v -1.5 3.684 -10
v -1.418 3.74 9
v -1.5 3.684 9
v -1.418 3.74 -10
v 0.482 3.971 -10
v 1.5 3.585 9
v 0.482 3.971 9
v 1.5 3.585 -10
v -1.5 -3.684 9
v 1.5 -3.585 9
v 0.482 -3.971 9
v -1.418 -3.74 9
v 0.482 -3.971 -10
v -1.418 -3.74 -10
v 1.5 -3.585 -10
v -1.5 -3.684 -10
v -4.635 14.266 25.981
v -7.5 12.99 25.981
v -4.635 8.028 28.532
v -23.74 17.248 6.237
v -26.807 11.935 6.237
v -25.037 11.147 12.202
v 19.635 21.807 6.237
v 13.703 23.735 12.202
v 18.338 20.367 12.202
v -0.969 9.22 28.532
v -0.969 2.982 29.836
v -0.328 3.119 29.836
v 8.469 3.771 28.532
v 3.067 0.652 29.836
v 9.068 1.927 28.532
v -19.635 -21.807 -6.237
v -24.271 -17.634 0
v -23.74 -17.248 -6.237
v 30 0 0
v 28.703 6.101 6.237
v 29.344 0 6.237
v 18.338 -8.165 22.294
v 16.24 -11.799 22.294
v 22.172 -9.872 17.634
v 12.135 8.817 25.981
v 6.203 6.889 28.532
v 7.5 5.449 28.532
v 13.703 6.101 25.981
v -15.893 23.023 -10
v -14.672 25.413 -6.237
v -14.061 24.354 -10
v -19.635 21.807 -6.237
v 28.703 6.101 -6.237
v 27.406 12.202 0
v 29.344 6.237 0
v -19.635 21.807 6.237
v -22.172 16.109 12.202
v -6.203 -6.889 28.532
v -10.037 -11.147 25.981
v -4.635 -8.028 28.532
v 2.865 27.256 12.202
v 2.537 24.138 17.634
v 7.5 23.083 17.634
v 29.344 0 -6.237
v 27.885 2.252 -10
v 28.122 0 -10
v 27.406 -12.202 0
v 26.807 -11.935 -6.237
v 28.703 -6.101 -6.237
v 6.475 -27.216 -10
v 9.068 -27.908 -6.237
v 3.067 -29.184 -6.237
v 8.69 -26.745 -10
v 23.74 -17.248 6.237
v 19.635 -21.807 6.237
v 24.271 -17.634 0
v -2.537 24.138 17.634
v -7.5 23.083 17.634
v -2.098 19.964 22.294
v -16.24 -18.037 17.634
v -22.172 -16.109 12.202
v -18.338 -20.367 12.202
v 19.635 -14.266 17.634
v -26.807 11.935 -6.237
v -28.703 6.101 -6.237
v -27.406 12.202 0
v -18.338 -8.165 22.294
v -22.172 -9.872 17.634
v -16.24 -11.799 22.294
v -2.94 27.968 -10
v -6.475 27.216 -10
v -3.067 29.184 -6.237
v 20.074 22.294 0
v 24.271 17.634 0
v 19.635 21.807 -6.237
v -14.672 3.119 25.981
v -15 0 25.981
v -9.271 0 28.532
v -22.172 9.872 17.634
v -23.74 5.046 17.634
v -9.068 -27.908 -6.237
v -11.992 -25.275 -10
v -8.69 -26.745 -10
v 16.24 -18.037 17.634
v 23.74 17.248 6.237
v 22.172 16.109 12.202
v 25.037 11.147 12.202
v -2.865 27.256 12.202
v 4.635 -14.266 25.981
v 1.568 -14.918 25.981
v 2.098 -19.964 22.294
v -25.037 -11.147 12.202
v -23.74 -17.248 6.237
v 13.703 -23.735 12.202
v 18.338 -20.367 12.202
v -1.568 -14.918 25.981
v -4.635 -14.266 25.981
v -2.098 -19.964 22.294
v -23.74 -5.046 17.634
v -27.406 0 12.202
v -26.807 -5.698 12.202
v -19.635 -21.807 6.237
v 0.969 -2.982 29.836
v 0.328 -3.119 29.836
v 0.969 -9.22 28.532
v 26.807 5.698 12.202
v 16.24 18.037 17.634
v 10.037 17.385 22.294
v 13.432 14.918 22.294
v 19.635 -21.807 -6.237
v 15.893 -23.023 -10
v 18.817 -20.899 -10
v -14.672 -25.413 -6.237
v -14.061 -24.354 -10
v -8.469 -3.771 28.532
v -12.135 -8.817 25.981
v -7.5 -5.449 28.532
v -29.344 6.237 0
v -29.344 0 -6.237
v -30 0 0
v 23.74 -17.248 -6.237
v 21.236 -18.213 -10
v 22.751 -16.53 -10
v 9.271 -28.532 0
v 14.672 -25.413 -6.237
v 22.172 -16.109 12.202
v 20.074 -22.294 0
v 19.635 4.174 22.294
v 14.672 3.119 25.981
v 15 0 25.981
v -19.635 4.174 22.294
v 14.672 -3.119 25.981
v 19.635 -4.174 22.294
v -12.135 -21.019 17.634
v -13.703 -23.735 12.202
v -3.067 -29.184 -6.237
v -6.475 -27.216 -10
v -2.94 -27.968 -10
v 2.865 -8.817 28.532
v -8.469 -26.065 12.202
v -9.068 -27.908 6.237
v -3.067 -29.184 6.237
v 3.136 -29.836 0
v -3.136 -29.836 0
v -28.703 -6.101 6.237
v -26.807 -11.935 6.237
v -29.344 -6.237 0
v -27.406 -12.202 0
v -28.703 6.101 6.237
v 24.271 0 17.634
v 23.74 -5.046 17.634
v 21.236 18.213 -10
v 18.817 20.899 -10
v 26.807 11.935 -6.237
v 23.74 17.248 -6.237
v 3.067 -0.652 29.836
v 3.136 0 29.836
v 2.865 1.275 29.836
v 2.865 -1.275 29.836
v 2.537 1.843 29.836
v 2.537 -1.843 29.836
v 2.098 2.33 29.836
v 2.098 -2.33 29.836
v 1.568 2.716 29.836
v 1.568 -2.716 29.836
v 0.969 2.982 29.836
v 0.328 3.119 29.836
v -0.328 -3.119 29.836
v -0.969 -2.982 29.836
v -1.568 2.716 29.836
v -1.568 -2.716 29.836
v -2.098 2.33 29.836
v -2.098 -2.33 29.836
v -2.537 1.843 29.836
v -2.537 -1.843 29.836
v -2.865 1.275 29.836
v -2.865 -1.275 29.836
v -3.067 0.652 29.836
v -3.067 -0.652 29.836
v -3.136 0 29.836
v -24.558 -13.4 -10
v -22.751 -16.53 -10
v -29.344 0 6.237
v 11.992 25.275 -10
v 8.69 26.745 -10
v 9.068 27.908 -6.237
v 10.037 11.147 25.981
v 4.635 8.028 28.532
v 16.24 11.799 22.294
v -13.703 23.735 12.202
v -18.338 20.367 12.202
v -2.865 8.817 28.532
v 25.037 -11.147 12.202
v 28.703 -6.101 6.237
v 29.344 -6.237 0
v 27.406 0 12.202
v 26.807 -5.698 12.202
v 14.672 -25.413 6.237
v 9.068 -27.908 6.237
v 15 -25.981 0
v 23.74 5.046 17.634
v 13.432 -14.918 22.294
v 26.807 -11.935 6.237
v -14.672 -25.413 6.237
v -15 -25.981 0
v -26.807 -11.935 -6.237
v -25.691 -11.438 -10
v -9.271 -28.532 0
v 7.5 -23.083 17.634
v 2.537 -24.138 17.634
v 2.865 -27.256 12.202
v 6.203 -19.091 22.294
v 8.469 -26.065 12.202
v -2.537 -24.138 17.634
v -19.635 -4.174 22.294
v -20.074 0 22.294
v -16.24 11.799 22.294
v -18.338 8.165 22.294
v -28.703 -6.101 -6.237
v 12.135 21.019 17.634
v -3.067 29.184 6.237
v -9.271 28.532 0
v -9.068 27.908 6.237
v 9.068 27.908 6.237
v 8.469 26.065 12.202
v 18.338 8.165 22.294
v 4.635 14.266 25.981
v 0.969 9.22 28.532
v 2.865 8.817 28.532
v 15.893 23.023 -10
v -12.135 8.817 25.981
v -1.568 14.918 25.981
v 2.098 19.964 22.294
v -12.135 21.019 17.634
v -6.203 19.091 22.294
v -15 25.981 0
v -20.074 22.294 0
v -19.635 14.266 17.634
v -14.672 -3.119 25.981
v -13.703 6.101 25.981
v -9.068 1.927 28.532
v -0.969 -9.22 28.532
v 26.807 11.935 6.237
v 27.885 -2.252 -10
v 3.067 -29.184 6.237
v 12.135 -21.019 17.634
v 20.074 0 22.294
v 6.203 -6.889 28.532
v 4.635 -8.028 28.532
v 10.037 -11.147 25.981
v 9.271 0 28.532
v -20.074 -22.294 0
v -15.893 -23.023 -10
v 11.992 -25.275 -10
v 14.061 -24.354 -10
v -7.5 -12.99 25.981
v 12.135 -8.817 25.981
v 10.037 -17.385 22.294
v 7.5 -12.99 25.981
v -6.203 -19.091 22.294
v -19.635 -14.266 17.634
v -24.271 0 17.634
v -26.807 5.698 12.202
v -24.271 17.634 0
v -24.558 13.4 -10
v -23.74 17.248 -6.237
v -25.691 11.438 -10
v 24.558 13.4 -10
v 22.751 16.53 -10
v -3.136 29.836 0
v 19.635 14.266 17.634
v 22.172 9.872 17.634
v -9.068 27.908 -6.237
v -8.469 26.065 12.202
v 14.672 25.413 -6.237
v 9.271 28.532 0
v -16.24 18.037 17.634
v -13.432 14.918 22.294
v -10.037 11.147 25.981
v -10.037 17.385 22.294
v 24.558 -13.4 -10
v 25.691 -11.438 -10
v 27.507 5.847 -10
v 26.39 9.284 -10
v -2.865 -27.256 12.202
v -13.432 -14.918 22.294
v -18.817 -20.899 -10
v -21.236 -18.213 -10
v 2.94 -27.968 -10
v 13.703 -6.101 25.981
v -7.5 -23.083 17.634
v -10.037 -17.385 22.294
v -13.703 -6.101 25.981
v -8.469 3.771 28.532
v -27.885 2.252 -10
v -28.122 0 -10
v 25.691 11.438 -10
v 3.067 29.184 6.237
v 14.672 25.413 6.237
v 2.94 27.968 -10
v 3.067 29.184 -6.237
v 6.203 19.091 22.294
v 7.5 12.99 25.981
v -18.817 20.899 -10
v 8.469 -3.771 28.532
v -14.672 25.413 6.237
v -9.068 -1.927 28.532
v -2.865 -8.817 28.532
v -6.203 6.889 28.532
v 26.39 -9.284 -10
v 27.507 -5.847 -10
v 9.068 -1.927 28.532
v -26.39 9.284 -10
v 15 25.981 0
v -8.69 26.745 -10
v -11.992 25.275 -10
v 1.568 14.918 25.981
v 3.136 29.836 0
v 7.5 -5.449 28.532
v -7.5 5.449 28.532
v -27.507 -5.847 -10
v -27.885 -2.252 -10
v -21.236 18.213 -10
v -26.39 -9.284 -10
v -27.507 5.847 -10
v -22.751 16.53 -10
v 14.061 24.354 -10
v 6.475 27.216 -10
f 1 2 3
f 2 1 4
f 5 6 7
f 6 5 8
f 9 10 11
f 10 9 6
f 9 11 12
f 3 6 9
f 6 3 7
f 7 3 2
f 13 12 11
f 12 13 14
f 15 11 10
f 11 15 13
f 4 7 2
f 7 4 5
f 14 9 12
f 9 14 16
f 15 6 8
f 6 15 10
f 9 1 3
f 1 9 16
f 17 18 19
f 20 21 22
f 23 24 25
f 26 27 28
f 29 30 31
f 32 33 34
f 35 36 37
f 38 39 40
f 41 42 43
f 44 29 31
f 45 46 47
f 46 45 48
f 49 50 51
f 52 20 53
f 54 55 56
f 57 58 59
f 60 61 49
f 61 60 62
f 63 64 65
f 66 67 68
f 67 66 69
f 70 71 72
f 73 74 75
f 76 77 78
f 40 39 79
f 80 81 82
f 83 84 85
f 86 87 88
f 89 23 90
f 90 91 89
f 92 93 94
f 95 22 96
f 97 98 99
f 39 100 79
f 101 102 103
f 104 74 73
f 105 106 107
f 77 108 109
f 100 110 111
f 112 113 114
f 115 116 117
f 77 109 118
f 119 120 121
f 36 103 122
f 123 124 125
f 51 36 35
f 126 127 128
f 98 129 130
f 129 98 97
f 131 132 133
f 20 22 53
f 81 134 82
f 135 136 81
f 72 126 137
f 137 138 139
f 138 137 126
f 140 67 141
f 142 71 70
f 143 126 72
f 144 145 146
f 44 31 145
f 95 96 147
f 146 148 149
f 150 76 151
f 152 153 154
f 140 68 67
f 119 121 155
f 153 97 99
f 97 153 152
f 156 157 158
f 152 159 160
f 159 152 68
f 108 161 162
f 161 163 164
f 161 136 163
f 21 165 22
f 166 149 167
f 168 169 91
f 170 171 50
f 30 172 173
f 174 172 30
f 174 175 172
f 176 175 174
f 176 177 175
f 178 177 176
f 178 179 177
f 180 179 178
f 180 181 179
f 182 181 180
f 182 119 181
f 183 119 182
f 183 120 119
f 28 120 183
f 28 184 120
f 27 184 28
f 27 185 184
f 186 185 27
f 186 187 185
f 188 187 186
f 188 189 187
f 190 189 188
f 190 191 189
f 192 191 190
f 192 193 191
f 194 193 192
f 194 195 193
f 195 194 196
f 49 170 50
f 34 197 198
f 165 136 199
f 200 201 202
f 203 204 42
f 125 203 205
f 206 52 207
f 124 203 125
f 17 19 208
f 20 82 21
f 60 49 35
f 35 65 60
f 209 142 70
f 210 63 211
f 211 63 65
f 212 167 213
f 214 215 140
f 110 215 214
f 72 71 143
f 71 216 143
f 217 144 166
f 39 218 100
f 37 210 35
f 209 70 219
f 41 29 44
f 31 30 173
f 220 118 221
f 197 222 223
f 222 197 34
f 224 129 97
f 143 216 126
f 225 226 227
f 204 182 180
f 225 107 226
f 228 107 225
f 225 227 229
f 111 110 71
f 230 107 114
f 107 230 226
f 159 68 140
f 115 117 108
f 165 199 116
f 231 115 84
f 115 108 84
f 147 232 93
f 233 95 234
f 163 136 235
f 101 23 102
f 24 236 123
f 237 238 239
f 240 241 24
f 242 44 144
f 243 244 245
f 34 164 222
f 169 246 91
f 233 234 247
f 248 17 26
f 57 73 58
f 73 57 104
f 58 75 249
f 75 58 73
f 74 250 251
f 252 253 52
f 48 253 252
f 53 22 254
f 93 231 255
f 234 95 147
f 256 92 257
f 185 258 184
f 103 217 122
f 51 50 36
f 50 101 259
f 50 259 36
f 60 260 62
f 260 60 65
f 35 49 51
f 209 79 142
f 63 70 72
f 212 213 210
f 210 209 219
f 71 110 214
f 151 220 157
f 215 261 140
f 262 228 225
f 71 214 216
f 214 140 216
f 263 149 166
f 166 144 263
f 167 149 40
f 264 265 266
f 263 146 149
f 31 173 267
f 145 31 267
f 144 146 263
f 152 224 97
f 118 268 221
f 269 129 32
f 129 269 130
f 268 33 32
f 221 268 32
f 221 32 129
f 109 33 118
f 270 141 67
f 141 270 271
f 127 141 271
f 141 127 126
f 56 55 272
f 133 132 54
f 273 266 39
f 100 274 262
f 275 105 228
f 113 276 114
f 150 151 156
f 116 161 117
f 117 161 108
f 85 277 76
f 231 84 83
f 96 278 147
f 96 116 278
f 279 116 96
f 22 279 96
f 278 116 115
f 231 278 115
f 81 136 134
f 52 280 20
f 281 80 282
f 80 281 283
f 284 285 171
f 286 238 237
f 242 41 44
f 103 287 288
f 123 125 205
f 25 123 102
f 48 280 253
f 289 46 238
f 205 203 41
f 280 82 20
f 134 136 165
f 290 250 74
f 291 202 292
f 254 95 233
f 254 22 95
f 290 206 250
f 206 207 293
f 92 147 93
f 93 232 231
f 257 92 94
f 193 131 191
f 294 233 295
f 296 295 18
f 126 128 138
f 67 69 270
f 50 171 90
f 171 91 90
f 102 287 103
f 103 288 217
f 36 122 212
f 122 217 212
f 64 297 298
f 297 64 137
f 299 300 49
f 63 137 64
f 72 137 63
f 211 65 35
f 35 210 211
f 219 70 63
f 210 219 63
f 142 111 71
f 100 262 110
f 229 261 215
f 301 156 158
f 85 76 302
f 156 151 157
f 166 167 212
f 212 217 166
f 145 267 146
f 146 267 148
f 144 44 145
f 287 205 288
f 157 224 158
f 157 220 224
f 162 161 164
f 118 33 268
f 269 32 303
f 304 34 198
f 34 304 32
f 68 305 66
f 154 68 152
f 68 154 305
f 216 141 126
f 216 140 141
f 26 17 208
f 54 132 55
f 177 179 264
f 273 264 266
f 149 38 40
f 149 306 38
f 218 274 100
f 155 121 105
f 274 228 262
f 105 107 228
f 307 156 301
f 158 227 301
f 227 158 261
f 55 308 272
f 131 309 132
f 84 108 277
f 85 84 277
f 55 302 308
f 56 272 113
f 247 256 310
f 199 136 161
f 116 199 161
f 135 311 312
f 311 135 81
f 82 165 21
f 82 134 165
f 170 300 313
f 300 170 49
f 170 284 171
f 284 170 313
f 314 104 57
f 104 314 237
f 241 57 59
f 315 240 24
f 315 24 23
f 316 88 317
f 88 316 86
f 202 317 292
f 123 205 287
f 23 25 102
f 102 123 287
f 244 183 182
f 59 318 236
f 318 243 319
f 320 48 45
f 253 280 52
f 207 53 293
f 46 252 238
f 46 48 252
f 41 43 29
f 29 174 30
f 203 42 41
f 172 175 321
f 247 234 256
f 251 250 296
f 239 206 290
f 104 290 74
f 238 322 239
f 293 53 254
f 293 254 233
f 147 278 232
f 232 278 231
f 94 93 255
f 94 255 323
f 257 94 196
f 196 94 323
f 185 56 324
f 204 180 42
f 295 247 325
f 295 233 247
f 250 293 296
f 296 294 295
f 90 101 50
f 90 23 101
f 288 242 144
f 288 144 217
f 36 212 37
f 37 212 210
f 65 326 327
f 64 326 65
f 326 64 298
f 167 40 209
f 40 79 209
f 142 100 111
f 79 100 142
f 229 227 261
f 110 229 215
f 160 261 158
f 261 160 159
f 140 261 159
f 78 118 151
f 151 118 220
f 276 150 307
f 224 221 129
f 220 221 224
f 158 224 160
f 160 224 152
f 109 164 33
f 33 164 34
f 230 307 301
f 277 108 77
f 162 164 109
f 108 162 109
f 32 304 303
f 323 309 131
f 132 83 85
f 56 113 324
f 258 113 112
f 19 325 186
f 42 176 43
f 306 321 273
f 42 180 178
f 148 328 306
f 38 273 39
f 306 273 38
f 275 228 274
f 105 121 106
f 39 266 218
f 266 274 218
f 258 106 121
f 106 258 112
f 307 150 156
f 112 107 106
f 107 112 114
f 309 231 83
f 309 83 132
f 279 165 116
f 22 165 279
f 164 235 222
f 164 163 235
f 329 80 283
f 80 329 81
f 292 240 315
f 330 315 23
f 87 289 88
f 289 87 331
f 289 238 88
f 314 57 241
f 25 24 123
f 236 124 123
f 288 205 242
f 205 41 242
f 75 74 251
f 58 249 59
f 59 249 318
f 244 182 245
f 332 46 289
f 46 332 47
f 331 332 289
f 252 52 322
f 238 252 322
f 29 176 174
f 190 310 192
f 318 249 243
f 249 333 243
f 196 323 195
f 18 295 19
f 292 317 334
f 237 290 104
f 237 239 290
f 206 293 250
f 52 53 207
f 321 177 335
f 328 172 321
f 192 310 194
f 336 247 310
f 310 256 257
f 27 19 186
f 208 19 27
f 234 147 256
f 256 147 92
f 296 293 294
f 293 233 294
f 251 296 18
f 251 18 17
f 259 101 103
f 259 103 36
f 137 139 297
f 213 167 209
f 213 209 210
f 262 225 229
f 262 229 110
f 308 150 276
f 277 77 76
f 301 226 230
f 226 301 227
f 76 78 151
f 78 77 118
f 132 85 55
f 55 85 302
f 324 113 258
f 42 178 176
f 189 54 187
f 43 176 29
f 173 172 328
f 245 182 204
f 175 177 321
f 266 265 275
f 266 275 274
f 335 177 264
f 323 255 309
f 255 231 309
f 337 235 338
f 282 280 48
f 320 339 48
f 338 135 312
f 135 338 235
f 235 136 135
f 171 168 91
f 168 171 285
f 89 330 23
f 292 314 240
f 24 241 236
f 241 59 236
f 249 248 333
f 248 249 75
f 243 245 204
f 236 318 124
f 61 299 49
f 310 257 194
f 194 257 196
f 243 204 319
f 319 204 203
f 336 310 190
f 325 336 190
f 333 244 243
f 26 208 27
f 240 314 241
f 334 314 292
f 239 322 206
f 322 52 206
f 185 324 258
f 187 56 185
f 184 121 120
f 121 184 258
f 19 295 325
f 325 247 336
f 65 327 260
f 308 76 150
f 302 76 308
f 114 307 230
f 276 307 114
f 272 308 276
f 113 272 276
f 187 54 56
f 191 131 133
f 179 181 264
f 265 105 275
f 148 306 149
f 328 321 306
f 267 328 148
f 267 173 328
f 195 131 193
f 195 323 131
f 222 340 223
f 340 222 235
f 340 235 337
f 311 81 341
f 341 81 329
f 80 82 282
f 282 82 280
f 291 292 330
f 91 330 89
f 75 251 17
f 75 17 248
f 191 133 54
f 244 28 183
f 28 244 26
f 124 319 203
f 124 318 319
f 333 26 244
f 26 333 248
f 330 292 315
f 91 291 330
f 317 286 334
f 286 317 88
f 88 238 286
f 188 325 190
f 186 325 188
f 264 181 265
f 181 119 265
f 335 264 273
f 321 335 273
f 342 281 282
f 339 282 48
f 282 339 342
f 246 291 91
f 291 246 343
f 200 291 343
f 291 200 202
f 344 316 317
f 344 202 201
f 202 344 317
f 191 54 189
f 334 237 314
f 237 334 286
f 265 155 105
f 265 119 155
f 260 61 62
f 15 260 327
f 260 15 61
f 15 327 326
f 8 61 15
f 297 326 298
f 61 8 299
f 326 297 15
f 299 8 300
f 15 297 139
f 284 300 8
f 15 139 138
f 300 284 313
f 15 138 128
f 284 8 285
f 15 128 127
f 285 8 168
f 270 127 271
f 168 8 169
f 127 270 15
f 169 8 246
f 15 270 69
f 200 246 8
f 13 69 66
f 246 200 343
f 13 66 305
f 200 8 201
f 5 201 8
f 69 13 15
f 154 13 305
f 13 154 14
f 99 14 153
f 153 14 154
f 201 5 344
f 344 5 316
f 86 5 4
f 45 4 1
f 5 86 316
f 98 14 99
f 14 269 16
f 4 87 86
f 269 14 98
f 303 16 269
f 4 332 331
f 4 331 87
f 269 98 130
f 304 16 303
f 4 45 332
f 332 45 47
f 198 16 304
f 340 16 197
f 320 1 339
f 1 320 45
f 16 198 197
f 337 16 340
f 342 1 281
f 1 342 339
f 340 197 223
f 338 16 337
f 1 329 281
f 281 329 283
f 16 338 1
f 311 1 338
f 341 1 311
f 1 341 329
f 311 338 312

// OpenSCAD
difference() {
sphere(30);
translate([-40,-40,-90]) cube(80);
    translate([0,0,-1]) {
difference() {
cylinder(h = 20, r = 4, center = true);
translate([1.5,-10,-15]) cube(30);  
  translate([-30 - 1.5,-10,-15]) cube(30);  
}
}
}
